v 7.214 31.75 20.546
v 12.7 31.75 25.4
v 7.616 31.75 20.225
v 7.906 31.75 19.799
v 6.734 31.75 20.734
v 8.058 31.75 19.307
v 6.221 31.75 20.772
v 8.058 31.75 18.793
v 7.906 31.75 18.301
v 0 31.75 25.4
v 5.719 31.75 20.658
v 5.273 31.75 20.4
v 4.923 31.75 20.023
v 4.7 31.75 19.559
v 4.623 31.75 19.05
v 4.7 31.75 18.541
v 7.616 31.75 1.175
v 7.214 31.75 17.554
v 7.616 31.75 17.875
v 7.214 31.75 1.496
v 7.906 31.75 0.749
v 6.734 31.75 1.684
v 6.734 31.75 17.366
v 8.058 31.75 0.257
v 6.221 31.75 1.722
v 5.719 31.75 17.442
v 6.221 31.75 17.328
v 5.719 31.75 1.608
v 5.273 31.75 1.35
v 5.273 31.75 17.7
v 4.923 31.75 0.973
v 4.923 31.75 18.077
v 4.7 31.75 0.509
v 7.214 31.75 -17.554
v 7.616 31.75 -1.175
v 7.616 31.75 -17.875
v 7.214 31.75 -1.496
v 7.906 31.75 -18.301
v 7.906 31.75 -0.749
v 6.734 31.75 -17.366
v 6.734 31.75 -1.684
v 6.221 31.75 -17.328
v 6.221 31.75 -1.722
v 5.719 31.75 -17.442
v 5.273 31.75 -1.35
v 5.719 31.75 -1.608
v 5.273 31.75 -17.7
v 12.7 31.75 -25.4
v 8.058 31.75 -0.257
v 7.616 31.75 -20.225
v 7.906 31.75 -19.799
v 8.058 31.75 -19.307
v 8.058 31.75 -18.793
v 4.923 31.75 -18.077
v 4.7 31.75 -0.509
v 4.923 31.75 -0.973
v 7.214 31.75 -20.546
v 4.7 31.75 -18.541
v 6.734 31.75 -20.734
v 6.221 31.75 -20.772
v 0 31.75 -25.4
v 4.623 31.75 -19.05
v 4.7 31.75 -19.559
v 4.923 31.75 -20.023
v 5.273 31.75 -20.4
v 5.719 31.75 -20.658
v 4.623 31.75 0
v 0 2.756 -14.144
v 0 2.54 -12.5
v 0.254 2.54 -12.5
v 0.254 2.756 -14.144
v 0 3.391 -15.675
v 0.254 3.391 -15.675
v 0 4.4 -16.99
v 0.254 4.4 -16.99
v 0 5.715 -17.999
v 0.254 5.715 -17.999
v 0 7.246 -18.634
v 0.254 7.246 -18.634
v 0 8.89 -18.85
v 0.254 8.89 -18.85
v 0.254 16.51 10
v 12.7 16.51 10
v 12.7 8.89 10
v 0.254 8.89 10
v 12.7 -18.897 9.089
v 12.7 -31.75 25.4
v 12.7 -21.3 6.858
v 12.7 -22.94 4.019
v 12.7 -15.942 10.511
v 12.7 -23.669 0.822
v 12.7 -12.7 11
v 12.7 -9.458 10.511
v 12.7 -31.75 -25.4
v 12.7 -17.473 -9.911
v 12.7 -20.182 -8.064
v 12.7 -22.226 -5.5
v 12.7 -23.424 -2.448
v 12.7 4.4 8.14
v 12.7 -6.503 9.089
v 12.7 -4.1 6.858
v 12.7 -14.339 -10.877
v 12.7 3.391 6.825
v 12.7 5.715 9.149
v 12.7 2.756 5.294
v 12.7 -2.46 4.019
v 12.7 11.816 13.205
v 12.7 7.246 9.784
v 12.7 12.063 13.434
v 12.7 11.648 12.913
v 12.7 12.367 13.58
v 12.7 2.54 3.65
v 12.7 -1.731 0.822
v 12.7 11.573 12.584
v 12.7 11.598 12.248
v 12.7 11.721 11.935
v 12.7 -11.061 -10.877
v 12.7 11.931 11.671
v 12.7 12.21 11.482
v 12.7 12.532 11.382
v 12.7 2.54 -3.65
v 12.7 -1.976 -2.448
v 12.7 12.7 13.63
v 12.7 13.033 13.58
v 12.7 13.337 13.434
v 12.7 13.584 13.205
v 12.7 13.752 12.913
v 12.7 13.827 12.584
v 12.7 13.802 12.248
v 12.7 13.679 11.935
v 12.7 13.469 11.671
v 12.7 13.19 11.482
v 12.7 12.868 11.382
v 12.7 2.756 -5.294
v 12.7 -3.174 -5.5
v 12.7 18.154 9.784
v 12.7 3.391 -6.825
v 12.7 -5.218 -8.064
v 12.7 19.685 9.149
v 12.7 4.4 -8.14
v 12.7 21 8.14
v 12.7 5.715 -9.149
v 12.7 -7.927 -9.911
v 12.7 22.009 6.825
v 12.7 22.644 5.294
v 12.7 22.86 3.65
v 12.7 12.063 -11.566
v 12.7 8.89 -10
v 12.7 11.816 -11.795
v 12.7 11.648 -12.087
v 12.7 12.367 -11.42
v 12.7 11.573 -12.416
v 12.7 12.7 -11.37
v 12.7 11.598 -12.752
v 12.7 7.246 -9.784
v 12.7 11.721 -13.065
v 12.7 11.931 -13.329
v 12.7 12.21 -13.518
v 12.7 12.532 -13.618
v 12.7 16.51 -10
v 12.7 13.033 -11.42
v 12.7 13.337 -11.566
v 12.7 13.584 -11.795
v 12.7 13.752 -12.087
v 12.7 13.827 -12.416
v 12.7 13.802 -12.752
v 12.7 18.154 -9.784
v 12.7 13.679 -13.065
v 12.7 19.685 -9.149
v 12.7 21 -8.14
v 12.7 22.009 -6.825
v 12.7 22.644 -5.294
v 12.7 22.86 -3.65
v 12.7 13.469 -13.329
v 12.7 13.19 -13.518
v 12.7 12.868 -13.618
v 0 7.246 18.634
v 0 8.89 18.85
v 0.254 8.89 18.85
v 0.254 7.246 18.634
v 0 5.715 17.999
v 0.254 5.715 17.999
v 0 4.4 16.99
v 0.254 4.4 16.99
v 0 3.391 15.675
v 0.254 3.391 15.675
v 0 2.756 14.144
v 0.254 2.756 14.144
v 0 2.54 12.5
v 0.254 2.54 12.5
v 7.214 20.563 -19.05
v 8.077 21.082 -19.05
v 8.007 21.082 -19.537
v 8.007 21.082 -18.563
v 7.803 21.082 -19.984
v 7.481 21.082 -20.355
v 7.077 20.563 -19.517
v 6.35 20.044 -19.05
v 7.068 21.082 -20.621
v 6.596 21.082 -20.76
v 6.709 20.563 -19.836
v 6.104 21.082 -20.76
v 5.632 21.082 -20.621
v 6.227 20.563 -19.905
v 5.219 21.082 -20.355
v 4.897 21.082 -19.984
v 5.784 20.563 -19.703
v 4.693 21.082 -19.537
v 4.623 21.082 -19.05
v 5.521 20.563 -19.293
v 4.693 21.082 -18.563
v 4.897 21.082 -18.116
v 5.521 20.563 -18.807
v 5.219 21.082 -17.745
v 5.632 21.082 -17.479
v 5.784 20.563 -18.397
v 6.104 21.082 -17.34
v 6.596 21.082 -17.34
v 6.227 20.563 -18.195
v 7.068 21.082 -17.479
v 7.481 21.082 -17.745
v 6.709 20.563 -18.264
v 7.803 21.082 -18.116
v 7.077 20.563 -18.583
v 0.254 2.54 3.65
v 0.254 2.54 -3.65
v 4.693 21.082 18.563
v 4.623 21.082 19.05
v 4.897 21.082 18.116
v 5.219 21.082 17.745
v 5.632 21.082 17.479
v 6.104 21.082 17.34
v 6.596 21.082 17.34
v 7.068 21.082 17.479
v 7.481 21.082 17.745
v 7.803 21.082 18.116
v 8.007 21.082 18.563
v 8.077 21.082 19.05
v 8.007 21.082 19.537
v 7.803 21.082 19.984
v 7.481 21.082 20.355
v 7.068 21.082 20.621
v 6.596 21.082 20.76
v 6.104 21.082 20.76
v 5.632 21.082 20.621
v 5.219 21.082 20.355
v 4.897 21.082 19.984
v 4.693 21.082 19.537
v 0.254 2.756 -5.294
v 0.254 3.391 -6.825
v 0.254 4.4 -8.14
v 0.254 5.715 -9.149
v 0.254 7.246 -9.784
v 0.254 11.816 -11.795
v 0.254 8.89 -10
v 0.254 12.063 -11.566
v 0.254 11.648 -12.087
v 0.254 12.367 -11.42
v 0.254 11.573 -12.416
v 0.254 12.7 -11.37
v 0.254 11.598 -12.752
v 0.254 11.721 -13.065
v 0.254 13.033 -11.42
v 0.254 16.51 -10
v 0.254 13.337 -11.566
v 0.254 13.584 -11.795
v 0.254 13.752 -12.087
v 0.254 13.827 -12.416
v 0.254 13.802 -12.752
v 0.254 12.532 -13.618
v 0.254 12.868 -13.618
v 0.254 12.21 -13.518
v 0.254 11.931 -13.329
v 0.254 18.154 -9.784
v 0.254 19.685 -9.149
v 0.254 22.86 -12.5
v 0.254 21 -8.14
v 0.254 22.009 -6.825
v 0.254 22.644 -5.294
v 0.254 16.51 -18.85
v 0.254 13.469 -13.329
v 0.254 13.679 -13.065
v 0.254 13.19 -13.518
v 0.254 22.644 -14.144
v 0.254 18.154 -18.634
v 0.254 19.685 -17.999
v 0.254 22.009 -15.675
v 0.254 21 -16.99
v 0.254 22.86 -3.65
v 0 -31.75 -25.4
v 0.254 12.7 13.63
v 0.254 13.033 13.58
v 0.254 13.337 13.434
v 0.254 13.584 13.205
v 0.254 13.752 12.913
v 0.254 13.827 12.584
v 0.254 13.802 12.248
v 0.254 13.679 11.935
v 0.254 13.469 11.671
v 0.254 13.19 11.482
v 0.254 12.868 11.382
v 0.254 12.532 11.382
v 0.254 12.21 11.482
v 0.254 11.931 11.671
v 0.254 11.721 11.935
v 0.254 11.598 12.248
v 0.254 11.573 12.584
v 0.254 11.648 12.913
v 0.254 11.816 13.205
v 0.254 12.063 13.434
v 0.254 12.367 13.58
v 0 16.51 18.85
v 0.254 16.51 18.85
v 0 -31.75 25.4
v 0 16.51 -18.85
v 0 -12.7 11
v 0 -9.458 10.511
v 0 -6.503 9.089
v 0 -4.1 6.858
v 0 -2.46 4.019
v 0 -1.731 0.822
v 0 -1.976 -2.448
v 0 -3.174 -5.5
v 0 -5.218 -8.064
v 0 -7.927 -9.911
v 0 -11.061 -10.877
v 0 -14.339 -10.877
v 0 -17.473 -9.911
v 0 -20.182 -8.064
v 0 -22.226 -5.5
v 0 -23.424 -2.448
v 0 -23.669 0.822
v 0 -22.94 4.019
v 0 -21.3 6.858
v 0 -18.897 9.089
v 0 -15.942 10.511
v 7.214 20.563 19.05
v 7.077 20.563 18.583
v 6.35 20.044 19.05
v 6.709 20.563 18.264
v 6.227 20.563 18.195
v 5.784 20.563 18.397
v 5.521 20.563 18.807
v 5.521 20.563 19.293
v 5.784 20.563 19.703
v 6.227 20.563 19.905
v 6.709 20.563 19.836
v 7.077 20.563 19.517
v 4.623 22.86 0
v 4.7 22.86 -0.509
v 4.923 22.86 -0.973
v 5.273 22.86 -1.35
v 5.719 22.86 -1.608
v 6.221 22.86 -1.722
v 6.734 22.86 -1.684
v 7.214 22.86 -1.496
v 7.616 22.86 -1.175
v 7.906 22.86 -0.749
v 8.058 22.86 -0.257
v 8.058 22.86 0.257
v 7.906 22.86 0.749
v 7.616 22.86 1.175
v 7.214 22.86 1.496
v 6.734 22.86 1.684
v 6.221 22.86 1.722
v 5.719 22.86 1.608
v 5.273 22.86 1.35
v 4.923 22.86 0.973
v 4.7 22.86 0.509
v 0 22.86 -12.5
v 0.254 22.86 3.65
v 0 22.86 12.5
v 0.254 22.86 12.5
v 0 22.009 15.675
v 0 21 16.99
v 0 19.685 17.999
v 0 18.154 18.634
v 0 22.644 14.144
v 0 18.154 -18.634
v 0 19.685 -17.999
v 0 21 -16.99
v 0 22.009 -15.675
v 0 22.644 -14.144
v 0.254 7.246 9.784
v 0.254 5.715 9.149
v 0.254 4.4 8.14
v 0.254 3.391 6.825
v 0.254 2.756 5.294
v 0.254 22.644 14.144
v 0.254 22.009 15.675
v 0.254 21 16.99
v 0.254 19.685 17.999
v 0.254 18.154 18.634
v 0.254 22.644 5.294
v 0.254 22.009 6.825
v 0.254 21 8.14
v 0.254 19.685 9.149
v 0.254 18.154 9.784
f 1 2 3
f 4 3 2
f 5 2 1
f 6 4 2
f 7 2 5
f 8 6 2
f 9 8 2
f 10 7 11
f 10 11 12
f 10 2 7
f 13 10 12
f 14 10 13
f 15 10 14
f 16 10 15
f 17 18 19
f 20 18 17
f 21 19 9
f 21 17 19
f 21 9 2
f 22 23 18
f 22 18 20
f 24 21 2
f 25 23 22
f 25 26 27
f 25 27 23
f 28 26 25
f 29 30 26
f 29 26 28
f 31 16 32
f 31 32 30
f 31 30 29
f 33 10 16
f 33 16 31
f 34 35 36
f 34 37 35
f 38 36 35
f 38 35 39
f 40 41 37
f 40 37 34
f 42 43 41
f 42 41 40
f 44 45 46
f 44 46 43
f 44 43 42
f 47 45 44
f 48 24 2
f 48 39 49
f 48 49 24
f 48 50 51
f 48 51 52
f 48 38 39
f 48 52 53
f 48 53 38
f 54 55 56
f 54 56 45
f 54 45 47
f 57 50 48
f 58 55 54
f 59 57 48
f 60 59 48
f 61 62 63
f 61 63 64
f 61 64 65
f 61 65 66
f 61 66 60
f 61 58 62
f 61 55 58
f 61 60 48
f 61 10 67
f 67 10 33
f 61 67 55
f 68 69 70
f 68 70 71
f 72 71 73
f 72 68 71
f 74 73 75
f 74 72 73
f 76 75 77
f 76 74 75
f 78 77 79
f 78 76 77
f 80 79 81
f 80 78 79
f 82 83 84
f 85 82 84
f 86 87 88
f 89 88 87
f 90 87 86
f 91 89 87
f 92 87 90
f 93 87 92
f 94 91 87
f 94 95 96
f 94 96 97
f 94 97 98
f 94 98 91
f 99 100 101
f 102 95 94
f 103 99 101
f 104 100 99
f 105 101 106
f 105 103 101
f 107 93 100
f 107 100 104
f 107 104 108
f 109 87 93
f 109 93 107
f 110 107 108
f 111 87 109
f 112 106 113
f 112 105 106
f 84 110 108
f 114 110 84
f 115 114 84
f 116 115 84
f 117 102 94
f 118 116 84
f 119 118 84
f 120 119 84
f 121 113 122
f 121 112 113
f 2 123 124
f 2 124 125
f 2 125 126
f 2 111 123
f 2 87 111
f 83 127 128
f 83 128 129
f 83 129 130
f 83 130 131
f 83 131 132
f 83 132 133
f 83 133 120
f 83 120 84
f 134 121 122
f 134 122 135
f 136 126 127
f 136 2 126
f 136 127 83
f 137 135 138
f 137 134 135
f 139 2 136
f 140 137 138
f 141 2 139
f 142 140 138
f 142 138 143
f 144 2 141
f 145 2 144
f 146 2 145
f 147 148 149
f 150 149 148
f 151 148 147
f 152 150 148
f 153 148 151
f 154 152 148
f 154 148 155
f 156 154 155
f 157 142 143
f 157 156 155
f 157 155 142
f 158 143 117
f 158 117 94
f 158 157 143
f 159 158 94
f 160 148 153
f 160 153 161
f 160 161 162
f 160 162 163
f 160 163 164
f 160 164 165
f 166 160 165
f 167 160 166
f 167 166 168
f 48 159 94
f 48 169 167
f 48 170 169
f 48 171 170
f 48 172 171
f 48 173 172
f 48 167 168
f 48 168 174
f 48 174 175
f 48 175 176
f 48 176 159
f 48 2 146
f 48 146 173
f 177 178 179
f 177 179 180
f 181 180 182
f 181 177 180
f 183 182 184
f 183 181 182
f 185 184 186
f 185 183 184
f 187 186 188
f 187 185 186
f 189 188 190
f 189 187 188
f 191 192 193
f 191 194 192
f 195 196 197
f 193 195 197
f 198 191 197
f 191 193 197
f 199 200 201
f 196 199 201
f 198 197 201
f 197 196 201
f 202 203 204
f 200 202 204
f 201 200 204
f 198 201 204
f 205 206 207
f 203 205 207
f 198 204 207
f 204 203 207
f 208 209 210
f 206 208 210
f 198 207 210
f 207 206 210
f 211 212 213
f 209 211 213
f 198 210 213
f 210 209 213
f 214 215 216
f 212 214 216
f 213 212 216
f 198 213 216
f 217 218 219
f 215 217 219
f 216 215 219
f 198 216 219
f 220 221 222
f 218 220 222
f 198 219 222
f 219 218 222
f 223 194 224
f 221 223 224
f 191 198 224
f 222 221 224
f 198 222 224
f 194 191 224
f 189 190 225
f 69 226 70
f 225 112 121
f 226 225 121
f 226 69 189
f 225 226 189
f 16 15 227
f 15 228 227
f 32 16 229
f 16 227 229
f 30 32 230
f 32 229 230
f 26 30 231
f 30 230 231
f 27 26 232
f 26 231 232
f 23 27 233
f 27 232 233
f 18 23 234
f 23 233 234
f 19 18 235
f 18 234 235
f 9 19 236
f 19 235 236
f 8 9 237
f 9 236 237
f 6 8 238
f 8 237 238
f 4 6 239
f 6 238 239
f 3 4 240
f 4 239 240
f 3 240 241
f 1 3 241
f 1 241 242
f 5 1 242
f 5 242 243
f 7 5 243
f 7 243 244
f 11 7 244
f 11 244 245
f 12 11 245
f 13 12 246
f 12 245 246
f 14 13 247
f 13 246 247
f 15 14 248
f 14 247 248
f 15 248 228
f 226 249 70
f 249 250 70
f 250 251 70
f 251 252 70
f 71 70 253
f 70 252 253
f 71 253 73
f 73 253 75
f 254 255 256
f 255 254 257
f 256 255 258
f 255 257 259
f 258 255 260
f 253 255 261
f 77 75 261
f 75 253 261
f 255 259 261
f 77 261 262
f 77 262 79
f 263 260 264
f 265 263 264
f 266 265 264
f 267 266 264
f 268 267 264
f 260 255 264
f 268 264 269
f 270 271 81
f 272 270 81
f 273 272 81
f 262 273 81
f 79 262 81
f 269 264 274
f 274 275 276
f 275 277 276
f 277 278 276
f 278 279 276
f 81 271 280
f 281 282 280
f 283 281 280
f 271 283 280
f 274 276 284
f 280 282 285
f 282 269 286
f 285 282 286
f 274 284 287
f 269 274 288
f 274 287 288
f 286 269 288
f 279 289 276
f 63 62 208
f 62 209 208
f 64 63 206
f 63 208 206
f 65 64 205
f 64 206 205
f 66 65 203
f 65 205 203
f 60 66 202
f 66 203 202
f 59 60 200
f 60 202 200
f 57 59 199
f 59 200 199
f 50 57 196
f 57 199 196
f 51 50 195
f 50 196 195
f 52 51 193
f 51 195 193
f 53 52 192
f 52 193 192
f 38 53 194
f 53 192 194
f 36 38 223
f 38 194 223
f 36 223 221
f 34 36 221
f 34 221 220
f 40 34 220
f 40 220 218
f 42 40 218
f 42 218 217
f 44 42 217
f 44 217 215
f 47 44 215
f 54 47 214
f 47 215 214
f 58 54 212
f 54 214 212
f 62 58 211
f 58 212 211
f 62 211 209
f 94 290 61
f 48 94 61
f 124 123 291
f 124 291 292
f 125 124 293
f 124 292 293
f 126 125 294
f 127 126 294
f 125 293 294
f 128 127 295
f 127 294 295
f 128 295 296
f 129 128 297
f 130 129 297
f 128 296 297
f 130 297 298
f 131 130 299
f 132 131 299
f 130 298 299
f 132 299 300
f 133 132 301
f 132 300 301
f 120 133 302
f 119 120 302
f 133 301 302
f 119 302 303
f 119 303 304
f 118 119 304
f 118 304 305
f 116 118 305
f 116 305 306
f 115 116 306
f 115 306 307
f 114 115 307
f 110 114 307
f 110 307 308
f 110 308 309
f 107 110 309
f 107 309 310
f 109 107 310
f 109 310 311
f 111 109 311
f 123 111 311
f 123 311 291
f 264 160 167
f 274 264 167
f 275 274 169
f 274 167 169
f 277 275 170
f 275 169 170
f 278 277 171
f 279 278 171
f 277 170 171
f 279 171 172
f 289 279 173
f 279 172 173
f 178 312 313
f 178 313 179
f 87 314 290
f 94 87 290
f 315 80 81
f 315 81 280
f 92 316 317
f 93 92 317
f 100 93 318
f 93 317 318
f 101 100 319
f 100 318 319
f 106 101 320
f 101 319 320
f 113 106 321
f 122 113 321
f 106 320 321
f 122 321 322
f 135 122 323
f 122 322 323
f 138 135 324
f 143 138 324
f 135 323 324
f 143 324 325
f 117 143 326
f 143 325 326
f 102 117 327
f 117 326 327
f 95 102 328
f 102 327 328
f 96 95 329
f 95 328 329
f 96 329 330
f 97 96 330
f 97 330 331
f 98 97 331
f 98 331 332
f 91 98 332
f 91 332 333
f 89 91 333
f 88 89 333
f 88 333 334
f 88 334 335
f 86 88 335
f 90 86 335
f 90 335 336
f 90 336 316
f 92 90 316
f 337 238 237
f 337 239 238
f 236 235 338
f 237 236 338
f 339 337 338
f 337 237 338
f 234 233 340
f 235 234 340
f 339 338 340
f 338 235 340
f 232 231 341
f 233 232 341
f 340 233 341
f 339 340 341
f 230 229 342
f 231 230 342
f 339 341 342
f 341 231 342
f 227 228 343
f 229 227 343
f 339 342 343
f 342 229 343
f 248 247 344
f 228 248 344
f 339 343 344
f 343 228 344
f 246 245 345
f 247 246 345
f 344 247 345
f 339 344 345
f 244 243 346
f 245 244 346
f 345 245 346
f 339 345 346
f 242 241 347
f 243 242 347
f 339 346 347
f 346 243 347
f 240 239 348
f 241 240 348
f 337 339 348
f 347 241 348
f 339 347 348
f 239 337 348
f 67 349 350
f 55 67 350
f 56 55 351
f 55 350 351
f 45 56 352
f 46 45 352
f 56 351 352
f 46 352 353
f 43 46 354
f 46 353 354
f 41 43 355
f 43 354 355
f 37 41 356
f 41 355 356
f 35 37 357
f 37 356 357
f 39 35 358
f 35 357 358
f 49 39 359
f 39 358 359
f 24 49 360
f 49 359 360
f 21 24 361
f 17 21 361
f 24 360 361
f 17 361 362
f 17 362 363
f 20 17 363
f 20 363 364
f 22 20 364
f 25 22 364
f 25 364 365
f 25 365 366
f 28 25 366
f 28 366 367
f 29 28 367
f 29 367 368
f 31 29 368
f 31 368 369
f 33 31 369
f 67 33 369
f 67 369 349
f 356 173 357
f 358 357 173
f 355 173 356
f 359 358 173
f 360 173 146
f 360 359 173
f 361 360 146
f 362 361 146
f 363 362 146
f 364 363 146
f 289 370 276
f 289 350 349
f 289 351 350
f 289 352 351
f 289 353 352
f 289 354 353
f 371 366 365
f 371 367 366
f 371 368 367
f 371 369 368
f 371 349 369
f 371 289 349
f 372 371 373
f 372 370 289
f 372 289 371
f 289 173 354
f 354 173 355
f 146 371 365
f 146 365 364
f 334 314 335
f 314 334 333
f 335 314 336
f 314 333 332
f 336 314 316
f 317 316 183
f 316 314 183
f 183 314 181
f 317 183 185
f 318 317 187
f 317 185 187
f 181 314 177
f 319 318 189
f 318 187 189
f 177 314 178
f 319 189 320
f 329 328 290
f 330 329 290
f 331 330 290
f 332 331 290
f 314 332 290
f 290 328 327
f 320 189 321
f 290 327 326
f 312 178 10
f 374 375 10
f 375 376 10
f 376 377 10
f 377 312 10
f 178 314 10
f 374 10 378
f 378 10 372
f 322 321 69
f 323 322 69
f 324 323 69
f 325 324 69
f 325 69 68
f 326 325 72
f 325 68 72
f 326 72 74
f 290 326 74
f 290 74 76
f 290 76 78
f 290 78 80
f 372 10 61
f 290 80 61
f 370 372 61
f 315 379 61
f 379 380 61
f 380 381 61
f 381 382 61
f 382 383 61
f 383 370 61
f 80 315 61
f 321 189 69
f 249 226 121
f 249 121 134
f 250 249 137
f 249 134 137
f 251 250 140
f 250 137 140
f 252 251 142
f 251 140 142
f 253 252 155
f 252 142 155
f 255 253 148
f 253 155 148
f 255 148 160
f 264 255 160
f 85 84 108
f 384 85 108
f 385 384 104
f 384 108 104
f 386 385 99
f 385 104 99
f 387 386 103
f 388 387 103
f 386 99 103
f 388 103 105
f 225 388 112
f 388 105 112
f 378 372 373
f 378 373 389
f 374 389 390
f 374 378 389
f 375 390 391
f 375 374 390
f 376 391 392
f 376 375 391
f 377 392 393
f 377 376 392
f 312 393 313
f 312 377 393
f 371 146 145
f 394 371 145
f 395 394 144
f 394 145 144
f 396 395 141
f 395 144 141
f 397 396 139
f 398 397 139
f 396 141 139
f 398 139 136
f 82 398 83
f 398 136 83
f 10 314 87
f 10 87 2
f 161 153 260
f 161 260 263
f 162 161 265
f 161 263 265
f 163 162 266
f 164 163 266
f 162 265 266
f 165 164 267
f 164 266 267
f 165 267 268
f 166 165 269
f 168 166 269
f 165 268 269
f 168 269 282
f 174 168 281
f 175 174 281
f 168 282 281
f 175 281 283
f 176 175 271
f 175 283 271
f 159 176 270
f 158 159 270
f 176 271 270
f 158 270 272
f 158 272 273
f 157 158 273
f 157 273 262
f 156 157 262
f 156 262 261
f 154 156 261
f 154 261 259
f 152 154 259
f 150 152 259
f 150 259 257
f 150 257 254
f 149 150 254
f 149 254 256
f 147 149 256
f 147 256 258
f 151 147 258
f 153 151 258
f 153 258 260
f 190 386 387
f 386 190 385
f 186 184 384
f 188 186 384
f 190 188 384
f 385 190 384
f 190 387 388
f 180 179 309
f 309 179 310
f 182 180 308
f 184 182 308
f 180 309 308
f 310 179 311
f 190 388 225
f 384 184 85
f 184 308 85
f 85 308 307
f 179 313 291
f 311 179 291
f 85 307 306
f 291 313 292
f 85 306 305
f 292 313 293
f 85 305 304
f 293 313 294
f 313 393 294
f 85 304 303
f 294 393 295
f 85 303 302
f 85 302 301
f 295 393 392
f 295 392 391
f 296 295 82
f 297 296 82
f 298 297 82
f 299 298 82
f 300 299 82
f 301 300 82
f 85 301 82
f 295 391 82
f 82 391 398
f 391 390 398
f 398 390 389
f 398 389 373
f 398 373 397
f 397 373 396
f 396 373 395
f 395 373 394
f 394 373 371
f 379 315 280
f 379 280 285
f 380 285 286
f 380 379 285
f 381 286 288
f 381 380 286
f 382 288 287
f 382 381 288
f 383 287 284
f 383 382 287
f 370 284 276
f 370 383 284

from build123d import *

# Parameters (mm, degrees)
SKETCH1_W                  = 50.8
SKETCH1_H                  = 63.5
BOSS_EXTRUDE1_DEPTH        = 12.7
F_22_0_22_DIAMETER_HOLE1_D = 22
F_4_40_TAPPED_HOLE1_D      = 2.2606
CUT_EXTRUDE1_DEPTH         = 43.597094971
CUT_EXTRUDE2_DEPTH         = 0.254
F_8_32_TAPPED_HOLE1_D      = 3.4544
F_8_32_TAPPED_HOLE1_DEPTH  = 10.668
F_8_32_TAPPED_HOLE1_TIP    = 1.037806461


with BuildPart() as part:
    # Sketch1 → Boss-Extrude1 (new body)
    with BuildSketch(Plane(origin=(0, 0, 0), x_dir=(0, 0, -1), z_dir=(1, 0, 0))):
        Rectangle(SKETCH1_W, SKETCH1_H)
    extrude(amount=BOSS_EXTRUDE1_DEPTH)

    # Ø22.0 (22) Diameter Hole1 (through all)
    with Locations(Plane(origin=(12.7, 0, 0), x_dir=(0, 0, -1), z_dir=(1, 0, 0))):
        with Locations((0, -12.7)):
            Hole(F_22_0_22_DIAMETER_HOLE1_D / 2)

    # Sketch4 → 1/16 NPT Tapped Hole1 (revolve, cut)
    with BuildSketch(Plane.ZX.offset(12.7)):
        Polygon((0, 0), (0, 13.530685027), (3.0734, 11.684), (3.0734, 6.858), (3.762574096, 6.858), (3.9679118, 0), align=None)
    revolve(axis=Axis((-6.35, 12.7, 0), (1, 0, 0)), mode=Mode.SUBTRACT)

    # #4-40 Tapped Hole1 (through all)
    with Locations(Plane(origin=(12.7, 0, 0), x_dir=(0, 0, -1), z_dir=(1, 0, 0))):
        with Locations((-12.5, 12.7), (12.5, 12.7)):
            Hole(F_4_40_TAPPED_HOLE1_D / 2)

    # Sketch9 → Cut-Extrude1 (cut, through all)
    with BuildSketch(Plane(origin=(12.7, 0, 0), x_dir=(0, 0, -1), z_dir=(1, 0, 0))):
        with BuildLine():
            Line((-3.65, 2.54), (3.65, 2.54))
            ThreePointArc((3.65, 2.54), (8.140128061, 4.399871939), (10, 8.89))
            Line((10, 8.89), (10, 16.51))
            ThreePointArc((10, 16.51), (8.140128061, 21.000128061), (3.65, 22.86))
            Line((3.65, 22.86), (-3.65, 22.86))
            ThreePointArc((-3.65, 22.86), (-8.140128061, 21.000128061), (-10, 16.51))
            Line((-10, 16.51), (-10, 8.89))
            ThreePointArc((-10, 8.89), (-8.140128061, 4.399871939), (-3.65, 2.54))
        make_face()
    extrude(amount=-CUT_EXTRUDE1_DEPTH, mode=Mode.SUBTRACT)

    # Sketch10 → Cut-Extrude2 (cut)
    with BuildSketch(Plane(origin=(0, 0, 0), x_dir=(0, 0, -1), z_dir=(1, 0, 0))):
        with BuildLine():
            Line((-12.5, 2.54), (12.5, 2.54))
            ThreePointArc((12.5, 2.54), (16.990128061, 4.399871939), (18.85, 8.89))
            Line((18.85, 8.89), (18.85, 16.51))
            ThreePointArc((18.85, 16.51), (16.990128061, 21.000128061), (12.5, 22.86))
            Line((12.5, 22.86), (-12.5, 22.86))
            ThreePointArc((-12.5, 22.86), (-16.990128061, 21.000128061), (-18.85, 16.51))
            Line((-18.85, 16.51), (-18.85, 8.89))
            ThreePointArc((-18.85, 8.89), (-16.990128061, 4.399871939), (-12.5, 2.54))
        make_face()
    extrude(amount=CUT_EXTRUDE2_DEPTH, mode=Mode.SUBTRACT)

    # #8-32 Tapped Hole1
    with Locations(Plane(origin=(0, 31.75, 0), x_dir=(1, 0, 0), z_dir=(0, 1, 0))):
        with Locations((6.35, 19.05), (6.35, -19.05), (6.35, 0)):
            Hole(F_8_32_TAPPED_HOLE1_D / 2, depth=F_8_32_TAPPED_HOLE1_DEPTH)
            with Locations((0, 0, -(F_8_32_TAPPED_HOLE1_DEPTH + F_8_32_TAPPED_HOLE1_TIP / 2))):  # 118° drill point
                Cone(0, F_8_32_TAPPED_HOLE1_D / 2, F_8_32_TAPPED_HOLE1_TIP, mode=Mode.SUBTRACT)


solid = part.part
